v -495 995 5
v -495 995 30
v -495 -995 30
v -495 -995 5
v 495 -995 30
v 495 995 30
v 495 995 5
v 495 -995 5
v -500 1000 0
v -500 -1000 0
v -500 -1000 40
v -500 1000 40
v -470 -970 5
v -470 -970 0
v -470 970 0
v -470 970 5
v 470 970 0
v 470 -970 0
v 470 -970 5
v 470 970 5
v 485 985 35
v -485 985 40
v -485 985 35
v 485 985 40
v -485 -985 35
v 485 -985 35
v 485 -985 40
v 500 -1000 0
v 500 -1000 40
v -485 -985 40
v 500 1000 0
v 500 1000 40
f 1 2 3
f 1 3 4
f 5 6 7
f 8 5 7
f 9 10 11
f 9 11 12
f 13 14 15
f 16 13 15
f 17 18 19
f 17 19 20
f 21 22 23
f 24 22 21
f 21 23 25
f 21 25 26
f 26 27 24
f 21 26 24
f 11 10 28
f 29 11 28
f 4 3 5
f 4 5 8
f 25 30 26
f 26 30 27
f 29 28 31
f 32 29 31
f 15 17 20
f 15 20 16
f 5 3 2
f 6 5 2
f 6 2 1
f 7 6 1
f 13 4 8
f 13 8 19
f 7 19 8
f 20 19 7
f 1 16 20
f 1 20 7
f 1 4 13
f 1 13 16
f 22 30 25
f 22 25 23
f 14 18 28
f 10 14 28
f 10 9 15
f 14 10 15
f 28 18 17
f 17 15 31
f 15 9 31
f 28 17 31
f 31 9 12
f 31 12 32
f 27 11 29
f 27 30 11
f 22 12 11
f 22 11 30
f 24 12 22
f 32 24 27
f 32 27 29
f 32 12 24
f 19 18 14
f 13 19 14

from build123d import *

# Parameters (mm, degrees)
CROQUIS1_W                 = 1000
CROQUIS1_H                 = 2000
SALIENTE_EXTRUIR2_DEPTH    = 40
CROQUIS2_W                 = 940
CROQUIS2_H                 = 1940
CORTAR_EXTRUIR1_DEPTH      = 30
CORTAR_EXTRUIR2_DEPTH      = 495
CORTAR_EXTRUIR2_DEPTH_BACK = 495
CROQUIS3_W                 = 25
CROQUIS3_H                 = 1990
CROQUIS4_W                 = 970
CROQUIS4_H                 = 1970
CORTAR_EXTRUIR3_DEPTH      = 5


with BuildPart() as part:
    # Croquis1 → Saliente-Extruir2 (new body)
    with BuildSketch(Plane.XY):
        Rectangle(CROQUIS1_W, CROQUIS1_H)
    extrude(amount=SALIENTE_EXTRUIR2_DEPTH)

    # Croquis2 → Cortar-Extruir1 (cut)
    with BuildSketch(Plane(origin=(0, 0, 0), x_dir=(-1, 0, 0), z_dir=(0, 0, -1))):
        Rectangle(CROQUIS2_W, CROQUIS2_H)
    extrude(amount=-CORTAR_EXTRUIR1_DEPTH, mode=Mode.SUBTRACT)

    # Croquis3 → Cortar-Extruir2 (cut, two sides: drawn at the far end of the back side and taken through both)
    with BuildSketch(Plane(origin=(0, 0, 0), x_dir=(0, 0, -1), z_dir=(1, 0, 0)).offset(-CORTAR_EXTRUIR2_DEPTH_BACK)):
        with Locations((-17.5, 0)):
            Rectangle(CROQUIS3_W, CROQUIS3_H)
    extrude(amount=CORTAR_EXTRUIR2_DEPTH + CORTAR_EXTRUIR2_DEPTH_BACK, mode=Mode.SUBTRACT)

    # Croquis4 → Cortar-Extruir3 (cut)
    with BuildSketch(Plane.XY.offset(40)):
        Rectangle(CROQUIS4_W, CROQUIS4_H)
    extrude(amount=-CORTAR_EXTRUIR3_DEPTH, mode=Mode.SUBTRACT)


solid = part.part
